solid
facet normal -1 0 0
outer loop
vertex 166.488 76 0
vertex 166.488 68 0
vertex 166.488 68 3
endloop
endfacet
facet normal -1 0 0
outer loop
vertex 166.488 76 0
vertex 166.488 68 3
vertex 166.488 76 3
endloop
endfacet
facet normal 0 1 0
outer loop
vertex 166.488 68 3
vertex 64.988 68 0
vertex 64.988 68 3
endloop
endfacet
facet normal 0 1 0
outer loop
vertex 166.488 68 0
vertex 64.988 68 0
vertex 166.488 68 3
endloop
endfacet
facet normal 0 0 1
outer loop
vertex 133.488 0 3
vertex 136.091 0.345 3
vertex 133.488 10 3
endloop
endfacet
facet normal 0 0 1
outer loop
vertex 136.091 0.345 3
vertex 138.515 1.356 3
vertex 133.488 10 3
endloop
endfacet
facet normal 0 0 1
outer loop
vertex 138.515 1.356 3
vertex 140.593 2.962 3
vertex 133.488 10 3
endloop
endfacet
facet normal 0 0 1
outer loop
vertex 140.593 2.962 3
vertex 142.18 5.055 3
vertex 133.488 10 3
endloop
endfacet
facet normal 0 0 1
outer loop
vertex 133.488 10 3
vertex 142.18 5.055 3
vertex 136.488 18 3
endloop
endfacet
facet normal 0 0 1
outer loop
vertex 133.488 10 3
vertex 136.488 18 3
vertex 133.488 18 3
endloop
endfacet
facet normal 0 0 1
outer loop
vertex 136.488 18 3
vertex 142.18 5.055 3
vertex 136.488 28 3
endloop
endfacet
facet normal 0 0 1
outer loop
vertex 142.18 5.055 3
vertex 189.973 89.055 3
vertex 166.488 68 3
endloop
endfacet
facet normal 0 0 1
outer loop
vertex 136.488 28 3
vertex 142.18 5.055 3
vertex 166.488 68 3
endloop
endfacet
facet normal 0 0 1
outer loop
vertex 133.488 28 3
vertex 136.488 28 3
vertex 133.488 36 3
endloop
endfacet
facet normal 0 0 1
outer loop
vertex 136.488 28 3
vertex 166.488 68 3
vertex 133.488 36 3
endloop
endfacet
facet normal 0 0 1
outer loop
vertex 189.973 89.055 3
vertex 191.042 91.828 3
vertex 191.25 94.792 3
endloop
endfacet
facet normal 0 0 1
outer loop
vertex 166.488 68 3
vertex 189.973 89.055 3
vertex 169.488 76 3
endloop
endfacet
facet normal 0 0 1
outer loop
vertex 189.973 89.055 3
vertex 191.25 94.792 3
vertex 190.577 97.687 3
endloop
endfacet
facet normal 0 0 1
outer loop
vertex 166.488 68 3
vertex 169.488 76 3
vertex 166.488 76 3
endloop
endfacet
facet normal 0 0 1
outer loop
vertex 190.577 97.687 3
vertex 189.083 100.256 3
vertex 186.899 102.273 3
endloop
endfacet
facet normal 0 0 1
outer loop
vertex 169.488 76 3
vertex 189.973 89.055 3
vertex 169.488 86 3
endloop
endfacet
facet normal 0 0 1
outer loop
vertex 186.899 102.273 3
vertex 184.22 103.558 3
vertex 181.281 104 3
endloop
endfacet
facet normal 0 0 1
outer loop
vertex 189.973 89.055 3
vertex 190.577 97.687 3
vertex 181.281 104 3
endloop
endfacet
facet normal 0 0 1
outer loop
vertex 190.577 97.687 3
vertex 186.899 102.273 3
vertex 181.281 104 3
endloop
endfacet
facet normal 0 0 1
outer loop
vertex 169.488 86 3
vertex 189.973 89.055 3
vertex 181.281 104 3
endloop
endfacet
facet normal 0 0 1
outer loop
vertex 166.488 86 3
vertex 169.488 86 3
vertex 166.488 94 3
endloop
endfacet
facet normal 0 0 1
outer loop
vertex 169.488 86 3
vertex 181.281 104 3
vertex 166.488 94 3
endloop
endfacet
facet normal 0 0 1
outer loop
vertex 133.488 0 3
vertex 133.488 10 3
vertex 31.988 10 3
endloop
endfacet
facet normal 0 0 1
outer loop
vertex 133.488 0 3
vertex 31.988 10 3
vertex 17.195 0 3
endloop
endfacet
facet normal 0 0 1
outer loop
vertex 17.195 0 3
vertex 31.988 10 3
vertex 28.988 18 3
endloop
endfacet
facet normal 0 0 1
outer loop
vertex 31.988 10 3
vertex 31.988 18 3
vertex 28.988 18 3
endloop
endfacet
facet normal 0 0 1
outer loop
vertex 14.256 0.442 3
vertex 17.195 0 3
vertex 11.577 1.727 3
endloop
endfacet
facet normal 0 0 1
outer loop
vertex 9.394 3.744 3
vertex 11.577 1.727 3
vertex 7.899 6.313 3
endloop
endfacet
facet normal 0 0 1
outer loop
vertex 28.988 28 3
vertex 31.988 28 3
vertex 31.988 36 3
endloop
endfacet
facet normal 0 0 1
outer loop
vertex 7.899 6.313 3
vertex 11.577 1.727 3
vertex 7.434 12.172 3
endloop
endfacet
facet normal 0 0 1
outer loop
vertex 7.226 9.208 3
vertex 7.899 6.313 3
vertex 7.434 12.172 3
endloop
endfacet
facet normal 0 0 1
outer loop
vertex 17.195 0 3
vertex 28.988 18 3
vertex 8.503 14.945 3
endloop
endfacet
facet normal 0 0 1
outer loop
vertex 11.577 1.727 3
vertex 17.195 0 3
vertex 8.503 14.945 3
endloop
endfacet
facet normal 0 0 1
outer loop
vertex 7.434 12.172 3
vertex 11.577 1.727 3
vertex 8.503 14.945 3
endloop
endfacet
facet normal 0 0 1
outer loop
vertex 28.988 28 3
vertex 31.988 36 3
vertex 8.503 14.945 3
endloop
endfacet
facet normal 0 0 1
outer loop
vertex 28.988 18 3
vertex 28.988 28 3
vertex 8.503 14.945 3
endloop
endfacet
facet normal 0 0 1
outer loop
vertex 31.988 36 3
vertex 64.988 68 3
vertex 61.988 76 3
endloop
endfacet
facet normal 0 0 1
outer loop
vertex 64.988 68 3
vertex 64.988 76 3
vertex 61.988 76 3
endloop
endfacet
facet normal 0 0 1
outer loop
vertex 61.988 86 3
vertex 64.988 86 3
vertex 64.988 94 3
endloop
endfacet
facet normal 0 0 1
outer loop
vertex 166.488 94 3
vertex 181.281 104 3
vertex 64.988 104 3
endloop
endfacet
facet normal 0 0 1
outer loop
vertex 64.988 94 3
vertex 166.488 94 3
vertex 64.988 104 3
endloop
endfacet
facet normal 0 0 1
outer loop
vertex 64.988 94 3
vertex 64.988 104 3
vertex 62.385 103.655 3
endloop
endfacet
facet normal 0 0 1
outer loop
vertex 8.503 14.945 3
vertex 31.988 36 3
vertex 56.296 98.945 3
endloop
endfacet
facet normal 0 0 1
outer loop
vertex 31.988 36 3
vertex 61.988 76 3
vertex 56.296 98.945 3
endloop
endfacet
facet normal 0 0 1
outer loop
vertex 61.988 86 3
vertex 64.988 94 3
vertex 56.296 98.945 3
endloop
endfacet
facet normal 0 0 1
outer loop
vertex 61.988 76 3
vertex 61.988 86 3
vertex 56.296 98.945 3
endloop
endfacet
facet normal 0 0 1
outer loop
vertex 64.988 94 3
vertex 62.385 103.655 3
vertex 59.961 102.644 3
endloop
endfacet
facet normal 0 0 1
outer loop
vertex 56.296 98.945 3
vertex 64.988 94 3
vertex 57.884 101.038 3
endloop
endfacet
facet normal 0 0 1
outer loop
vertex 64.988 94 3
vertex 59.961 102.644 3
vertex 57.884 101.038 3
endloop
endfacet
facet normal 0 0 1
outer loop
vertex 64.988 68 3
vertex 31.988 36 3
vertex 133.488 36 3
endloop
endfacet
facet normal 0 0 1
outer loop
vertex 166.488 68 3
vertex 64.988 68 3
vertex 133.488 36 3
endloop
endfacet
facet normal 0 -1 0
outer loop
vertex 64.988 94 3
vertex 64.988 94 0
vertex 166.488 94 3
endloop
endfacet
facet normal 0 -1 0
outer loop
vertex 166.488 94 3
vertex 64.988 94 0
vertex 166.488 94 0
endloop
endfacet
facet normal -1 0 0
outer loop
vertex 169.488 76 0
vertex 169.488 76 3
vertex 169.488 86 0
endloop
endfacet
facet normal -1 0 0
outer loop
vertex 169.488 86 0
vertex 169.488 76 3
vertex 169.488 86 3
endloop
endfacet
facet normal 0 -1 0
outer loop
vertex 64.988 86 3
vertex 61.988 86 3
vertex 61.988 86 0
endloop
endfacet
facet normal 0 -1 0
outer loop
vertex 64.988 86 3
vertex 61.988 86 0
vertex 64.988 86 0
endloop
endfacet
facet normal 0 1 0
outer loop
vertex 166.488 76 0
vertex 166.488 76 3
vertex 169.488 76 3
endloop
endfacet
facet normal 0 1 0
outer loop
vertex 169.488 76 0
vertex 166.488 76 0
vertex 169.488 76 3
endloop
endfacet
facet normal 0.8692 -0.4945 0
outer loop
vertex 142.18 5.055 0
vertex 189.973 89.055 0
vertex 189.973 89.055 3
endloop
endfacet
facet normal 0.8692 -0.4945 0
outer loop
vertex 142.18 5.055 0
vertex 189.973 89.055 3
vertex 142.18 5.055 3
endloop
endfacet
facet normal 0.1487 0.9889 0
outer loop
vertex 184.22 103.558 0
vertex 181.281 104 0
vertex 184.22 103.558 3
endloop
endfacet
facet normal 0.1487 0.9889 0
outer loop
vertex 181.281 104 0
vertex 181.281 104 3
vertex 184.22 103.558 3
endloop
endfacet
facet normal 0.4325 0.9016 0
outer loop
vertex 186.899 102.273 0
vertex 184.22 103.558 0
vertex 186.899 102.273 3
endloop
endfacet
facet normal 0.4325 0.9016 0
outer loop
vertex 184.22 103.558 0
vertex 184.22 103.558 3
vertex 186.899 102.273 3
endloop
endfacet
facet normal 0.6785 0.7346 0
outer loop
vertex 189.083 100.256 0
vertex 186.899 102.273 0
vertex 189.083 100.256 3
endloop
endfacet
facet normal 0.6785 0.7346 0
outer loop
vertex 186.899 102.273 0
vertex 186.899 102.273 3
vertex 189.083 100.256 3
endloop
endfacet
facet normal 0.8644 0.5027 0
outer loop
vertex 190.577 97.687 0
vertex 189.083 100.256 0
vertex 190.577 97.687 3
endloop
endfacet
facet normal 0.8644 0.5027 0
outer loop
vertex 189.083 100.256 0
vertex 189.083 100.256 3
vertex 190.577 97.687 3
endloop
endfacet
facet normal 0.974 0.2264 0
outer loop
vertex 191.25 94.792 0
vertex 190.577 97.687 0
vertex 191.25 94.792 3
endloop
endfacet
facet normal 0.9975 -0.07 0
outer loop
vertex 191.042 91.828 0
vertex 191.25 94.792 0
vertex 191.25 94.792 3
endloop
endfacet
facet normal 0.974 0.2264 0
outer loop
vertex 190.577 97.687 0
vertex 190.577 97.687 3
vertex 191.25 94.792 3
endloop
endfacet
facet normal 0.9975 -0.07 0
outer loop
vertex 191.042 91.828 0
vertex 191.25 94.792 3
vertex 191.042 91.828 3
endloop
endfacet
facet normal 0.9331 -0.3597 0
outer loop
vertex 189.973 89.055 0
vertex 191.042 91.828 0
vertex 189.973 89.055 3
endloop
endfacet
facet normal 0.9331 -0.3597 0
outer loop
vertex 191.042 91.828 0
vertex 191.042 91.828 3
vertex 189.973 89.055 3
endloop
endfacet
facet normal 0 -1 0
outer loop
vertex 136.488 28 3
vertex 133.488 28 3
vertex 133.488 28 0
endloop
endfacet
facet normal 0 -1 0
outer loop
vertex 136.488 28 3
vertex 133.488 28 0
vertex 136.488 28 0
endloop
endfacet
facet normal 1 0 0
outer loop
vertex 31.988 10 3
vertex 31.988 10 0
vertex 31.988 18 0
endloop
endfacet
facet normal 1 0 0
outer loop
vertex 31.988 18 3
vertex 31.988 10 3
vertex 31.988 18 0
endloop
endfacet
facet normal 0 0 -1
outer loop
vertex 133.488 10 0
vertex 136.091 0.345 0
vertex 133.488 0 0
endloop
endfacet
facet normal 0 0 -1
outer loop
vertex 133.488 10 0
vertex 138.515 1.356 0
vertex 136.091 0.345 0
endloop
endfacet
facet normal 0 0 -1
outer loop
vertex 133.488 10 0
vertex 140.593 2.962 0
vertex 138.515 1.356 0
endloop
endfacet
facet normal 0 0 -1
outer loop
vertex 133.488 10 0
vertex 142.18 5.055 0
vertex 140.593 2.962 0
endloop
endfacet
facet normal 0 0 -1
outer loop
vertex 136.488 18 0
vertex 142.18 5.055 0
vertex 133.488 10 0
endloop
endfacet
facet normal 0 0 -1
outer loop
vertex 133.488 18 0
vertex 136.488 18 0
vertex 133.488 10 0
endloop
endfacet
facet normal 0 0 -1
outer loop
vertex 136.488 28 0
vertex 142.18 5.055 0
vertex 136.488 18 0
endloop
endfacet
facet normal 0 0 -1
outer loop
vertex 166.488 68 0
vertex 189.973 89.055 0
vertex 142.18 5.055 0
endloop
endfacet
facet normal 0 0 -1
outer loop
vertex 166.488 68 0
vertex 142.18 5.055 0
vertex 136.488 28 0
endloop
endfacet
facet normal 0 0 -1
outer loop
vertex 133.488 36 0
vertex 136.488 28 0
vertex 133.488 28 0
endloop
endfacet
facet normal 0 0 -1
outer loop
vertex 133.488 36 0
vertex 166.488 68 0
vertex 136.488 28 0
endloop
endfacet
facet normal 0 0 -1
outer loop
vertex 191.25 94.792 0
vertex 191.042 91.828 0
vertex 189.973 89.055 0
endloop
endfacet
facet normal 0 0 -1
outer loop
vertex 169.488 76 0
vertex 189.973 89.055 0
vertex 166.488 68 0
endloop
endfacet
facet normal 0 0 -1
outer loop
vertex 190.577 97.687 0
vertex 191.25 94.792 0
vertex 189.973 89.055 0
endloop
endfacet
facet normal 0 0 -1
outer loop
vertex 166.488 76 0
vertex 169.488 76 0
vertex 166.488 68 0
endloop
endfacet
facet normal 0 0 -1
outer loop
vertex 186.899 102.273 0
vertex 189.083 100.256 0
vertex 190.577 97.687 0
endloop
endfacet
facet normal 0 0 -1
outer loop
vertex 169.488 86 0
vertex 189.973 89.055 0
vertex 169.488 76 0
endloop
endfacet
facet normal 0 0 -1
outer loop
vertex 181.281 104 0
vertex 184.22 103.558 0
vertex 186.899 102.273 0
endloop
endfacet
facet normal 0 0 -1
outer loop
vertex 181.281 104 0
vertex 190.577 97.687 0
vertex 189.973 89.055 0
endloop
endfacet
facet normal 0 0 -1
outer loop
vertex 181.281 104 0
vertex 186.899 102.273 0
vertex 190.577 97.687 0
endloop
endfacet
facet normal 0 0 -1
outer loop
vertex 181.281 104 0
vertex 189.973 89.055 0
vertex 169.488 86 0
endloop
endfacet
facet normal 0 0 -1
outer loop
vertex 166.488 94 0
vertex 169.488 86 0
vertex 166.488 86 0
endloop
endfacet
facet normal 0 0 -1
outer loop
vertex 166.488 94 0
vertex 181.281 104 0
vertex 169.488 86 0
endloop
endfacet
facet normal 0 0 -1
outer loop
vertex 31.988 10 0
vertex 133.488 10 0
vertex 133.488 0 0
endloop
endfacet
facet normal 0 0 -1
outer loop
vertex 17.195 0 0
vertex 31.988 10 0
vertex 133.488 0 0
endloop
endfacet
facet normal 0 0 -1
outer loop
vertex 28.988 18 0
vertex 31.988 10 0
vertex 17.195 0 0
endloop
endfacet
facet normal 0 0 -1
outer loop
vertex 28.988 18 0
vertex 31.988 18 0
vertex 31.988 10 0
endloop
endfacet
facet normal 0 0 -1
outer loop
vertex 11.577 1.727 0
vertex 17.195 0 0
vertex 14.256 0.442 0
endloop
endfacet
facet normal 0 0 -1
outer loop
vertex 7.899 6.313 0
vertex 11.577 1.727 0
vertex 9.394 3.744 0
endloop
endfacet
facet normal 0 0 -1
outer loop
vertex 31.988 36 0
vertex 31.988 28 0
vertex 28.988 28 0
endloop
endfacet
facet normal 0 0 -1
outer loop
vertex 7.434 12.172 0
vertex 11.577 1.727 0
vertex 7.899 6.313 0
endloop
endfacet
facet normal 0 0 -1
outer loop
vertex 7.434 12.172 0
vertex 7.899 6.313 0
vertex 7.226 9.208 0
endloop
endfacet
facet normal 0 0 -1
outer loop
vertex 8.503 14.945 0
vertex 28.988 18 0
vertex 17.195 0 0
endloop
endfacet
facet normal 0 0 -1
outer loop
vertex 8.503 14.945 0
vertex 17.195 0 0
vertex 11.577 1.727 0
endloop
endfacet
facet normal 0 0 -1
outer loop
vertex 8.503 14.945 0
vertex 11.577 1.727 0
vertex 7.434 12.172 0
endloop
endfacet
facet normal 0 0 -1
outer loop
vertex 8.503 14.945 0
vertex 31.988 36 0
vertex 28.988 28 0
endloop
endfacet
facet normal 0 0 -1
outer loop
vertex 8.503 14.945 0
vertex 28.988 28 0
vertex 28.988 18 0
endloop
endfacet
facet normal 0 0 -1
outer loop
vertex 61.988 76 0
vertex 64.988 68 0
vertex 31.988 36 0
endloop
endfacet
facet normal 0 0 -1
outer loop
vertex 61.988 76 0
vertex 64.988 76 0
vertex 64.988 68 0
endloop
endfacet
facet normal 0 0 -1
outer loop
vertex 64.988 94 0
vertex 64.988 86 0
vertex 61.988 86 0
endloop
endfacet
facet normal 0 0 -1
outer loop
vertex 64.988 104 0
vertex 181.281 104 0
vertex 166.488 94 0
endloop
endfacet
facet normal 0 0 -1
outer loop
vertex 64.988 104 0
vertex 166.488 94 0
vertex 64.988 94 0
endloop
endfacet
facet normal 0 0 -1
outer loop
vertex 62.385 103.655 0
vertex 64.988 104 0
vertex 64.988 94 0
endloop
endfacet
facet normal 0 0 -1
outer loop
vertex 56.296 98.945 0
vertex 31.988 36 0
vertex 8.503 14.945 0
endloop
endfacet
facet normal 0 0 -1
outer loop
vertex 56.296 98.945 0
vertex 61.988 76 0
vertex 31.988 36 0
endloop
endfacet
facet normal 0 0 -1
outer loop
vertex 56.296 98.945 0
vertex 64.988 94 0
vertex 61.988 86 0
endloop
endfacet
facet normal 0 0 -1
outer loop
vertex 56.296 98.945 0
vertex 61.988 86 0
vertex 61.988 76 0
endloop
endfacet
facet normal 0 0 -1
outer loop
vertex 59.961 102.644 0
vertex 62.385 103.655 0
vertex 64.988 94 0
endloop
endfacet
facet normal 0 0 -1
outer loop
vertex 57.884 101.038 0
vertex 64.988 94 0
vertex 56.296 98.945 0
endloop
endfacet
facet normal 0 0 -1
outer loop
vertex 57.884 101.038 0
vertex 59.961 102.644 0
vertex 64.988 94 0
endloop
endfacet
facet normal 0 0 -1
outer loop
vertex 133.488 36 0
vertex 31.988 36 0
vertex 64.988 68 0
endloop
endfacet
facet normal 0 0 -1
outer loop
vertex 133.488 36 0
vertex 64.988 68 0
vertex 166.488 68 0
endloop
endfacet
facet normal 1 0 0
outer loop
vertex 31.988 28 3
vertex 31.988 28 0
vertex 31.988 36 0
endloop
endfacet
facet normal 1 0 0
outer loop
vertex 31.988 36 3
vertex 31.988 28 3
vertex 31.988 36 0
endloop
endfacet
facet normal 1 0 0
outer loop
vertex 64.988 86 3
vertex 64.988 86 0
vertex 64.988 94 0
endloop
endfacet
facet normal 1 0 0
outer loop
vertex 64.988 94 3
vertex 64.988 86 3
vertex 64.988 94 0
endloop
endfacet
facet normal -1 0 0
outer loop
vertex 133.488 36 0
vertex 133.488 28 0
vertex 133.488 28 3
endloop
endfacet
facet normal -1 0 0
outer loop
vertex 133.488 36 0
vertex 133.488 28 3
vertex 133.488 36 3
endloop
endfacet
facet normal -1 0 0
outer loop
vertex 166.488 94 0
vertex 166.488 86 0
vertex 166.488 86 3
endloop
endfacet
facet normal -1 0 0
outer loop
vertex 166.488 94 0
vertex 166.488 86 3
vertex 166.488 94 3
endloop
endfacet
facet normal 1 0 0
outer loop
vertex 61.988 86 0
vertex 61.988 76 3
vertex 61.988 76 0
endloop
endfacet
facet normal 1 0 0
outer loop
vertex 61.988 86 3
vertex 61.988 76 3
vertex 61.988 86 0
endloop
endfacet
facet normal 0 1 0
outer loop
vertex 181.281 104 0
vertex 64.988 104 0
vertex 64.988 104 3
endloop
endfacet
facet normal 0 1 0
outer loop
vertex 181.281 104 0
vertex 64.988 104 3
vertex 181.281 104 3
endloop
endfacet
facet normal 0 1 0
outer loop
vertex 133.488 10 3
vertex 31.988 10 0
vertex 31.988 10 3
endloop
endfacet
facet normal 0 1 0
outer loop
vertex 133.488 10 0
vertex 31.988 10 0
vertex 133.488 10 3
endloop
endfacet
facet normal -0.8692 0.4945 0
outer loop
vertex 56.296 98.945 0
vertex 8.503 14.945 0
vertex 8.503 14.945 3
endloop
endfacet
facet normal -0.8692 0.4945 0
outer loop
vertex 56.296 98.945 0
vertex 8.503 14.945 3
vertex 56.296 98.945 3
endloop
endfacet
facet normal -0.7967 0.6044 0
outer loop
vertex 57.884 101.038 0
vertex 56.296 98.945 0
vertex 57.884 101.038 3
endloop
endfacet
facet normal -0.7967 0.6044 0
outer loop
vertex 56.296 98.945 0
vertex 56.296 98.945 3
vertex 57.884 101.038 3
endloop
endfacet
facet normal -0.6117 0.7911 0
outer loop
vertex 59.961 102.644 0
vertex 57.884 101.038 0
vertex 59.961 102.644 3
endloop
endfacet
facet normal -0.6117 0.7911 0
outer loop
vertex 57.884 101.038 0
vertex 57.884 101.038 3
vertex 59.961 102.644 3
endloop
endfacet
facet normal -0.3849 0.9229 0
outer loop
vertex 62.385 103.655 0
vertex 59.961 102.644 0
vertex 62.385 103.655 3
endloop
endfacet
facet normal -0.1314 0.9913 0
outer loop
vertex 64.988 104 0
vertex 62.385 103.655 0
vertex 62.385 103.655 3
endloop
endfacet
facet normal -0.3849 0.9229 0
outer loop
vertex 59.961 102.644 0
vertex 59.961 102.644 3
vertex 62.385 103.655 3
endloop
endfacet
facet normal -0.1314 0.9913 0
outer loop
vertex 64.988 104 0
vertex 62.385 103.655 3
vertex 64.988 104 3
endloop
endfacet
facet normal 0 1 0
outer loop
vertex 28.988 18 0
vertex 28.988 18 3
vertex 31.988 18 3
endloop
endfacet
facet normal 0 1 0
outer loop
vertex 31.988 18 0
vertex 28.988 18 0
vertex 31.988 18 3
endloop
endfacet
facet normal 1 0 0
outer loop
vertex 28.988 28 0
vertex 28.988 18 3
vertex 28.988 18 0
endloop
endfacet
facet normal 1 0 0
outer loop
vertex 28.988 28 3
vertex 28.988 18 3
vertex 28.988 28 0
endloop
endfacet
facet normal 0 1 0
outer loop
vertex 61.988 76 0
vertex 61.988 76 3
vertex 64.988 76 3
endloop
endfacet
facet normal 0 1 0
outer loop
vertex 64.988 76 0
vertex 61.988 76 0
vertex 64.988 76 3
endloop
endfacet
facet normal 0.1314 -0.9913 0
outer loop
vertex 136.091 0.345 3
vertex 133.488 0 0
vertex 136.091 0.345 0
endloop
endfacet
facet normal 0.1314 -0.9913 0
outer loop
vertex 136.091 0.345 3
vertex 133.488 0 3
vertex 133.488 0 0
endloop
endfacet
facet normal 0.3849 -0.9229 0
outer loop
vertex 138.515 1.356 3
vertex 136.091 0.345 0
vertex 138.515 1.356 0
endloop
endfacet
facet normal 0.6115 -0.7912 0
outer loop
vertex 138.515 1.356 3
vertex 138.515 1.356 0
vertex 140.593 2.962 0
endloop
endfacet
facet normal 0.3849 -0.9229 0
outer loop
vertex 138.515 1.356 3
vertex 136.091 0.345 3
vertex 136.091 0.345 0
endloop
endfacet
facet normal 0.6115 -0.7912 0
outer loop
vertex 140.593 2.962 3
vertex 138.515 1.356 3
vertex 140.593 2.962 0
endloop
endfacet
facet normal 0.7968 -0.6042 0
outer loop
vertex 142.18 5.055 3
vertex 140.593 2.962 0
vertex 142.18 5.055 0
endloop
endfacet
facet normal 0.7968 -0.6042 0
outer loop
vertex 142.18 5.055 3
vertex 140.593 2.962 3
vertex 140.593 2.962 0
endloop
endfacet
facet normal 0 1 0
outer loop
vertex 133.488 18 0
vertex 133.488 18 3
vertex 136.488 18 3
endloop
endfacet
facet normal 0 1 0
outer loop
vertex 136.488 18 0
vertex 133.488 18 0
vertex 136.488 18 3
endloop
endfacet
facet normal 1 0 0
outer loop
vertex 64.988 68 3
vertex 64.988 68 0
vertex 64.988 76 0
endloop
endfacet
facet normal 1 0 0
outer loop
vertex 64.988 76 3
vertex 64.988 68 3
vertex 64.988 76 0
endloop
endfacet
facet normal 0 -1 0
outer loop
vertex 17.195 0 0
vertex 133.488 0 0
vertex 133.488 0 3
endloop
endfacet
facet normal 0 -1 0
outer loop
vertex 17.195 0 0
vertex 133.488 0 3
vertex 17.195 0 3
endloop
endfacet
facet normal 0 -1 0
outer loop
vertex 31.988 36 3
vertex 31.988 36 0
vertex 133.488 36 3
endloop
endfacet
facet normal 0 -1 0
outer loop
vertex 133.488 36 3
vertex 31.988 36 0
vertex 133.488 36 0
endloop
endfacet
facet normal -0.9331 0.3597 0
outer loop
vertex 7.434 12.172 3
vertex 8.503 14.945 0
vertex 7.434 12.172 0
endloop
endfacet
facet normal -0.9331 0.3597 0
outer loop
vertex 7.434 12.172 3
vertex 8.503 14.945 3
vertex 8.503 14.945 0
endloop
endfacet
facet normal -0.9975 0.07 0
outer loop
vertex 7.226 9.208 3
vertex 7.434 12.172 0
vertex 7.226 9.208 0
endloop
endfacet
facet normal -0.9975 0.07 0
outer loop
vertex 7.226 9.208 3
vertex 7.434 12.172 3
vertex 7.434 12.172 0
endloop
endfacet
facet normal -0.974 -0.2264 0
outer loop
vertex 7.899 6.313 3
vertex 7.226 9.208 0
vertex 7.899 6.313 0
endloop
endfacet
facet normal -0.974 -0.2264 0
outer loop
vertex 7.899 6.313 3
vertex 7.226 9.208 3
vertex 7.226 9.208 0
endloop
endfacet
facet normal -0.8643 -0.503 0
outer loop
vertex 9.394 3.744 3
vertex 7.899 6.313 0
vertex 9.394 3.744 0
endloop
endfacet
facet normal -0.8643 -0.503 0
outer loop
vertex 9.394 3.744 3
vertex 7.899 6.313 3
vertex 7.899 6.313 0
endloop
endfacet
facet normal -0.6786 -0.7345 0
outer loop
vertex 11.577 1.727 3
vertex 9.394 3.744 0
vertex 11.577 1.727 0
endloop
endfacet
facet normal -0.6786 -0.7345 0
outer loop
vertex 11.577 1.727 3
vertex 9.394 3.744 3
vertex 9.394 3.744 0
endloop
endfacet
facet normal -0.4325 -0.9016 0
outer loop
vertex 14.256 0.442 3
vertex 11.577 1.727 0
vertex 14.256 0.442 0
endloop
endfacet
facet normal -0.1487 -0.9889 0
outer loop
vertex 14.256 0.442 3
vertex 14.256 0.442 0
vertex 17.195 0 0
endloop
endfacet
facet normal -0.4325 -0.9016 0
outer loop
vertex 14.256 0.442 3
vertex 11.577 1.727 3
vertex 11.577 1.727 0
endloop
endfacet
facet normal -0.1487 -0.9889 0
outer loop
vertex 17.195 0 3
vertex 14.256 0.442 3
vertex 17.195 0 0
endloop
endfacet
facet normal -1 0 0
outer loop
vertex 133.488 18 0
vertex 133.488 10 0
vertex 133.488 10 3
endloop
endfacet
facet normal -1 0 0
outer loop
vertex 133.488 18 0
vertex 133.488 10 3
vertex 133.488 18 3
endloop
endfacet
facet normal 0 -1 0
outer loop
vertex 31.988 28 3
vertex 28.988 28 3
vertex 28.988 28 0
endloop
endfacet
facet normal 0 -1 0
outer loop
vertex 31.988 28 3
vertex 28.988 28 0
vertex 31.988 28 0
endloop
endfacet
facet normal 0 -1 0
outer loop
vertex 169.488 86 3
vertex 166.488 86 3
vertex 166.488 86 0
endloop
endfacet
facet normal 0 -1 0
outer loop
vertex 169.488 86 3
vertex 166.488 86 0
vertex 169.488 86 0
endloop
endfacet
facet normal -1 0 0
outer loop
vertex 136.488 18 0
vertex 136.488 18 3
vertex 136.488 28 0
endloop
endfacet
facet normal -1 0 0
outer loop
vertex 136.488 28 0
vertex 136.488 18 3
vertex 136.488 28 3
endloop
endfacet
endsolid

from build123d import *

# Parameters (mm, degrees)
SKIZZE1_W                       = 101.5
SKIZZE1_H                       = 26
AUFSATZ_LINEAR_AUSTRAGEN1_DEPTH = 3
VERRUNDUNG1_R                   = 10
SCHNITT_LINEAR_AUSTRAGEN2_REACH = 5
SKIZZE2_W                       = 3
SKIZZE2_H                       = 10


with BuildPart() as part:
    # Skizze1 → Aufsatz-Linear austragen1 (new body)
    with BuildSketch(Plane.XY):
        Polygon((0, 0), (59.172413793, 104), (198.476138787, 104), (139.303724994, 0), align=None)
        with Locations((82.738069394, 23)):
            Rectangle(SKIZZE1_W, SKIZZE1_H, mode=Mode.SUBTRACT)
        with Locations((115.738069394, 81)):
            Rectangle(SKIZZE1_W, SKIZZE1_H, mode=Mode.SUBTRACT)
    extrude(amount=AUFSATZ_LINEAR_AUSTRAGEN1_DEPTH)

    # Verrundung1
    verrundung1_edges = [part.edges().sort_by_distance(p)[0] for p in [
        (0, 0, 1.5),
        (59.172413793, 104, 1.5),
        (198.476138787, 104, 1.5),
        (139.303724994, 0, 1.5),
    ]]
    fillet(verrundung1_edges, radius=VERRUNDUNG1_R)

    # Skizze2 → Schnitt-Linear austragen2 (cut, up to next)
    with BuildSketch(Plane.XY.offset(3), mode=Mode.PRIVATE) as schnitt_linear_austragen2_sk1:
        with Locations((63.488069394, 81)):
            Rectangle(SKIZZE2_W, SKIZZE2_H)
    schnitt_linear_austragen2_tool1 = extrude(schnitt_linear_austragen2_sk1.sketch, amount=-SCHNITT_LINEAR_AUSTRAGEN2_REACH, mode=Mode.PRIVATE) & part.part
    add(schnitt_linear_austragen2_tool1.solids().sort_by_distance((63.488069, 81, 3))[0], mode=Mode.SUBTRACT)
    # Skizze2 → Schnitt-Linear austragen2 (cut, up to next)
    with BuildSketch(Plane.XY.offset(3), mode=Mode.PRIVATE) as schnitt_linear_austragen2_sk2:
        with Locations((167.988069394, 81)):
            Rectangle(SKIZZE2_W, SKIZZE2_H)
    schnitt_linear_austragen2_tool2 = extrude(schnitt_linear_austragen2_sk2.sketch, amount=-SCHNITT_LINEAR_AUSTRAGEN2_REACH, mode=Mode.PRIVATE) & part.part
    add(schnitt_linear_austragen2_tool2.solids().sort_by_distance((167.988069, 81, 3))[0], mode=Mode.SUBTRACT)
    # Skizze2 → Schnitt-Linear austragen2 (cut, up to next)
    with BuildSketch(Plane.XY.offset(3), mode=Mode.PRIVATE) as schnitt_linear_austragen2_sk3:
        with Locations((30.488069394, 23)):
            Rectangle(SKIZZE2_W, SKIZZE2_H)
    schnitt_linear_austragen2_tool3 = extrude(schnitt_linear_austragen2_sk3.sketch, amount=-SCHNITT_LINEAR_AUSTRAGEN2_REACH, mode=Mode.PRIVATE) & part.part
    add(schnitt_linear_austragen2_tool3.solids().sort_by_distance((30.488069, 23, 3))[0], mode=Mode.SUBTRACT)
    # Skizze2 → Schnitt-Linear austragen2 (cut, up to next)
    with BuildSketch(Plane.XY.offset(3), mode=Mode.PRIVATE) as schnitt_linear_austragen2_sk4:
        with Locations((134.988069394, 23)):
            Rectangle(SKIZZE2_W, SKIZZE2_H)
    schnitt_linear_austragen2_tool4 = extrude(schnitt_linear_austragen2_sk4.sketch, amount=-SCHNITT_LINEAR_AUSTRAGEN2_REACH, mode=Mode.PRIVATE) & part.part
    add(schnitt_linear_austragen2_tool4.solids().sort_by_distance((134.988069, 23, 3))[0], mode=Mode.SUBTRACT)


solid = part.part
